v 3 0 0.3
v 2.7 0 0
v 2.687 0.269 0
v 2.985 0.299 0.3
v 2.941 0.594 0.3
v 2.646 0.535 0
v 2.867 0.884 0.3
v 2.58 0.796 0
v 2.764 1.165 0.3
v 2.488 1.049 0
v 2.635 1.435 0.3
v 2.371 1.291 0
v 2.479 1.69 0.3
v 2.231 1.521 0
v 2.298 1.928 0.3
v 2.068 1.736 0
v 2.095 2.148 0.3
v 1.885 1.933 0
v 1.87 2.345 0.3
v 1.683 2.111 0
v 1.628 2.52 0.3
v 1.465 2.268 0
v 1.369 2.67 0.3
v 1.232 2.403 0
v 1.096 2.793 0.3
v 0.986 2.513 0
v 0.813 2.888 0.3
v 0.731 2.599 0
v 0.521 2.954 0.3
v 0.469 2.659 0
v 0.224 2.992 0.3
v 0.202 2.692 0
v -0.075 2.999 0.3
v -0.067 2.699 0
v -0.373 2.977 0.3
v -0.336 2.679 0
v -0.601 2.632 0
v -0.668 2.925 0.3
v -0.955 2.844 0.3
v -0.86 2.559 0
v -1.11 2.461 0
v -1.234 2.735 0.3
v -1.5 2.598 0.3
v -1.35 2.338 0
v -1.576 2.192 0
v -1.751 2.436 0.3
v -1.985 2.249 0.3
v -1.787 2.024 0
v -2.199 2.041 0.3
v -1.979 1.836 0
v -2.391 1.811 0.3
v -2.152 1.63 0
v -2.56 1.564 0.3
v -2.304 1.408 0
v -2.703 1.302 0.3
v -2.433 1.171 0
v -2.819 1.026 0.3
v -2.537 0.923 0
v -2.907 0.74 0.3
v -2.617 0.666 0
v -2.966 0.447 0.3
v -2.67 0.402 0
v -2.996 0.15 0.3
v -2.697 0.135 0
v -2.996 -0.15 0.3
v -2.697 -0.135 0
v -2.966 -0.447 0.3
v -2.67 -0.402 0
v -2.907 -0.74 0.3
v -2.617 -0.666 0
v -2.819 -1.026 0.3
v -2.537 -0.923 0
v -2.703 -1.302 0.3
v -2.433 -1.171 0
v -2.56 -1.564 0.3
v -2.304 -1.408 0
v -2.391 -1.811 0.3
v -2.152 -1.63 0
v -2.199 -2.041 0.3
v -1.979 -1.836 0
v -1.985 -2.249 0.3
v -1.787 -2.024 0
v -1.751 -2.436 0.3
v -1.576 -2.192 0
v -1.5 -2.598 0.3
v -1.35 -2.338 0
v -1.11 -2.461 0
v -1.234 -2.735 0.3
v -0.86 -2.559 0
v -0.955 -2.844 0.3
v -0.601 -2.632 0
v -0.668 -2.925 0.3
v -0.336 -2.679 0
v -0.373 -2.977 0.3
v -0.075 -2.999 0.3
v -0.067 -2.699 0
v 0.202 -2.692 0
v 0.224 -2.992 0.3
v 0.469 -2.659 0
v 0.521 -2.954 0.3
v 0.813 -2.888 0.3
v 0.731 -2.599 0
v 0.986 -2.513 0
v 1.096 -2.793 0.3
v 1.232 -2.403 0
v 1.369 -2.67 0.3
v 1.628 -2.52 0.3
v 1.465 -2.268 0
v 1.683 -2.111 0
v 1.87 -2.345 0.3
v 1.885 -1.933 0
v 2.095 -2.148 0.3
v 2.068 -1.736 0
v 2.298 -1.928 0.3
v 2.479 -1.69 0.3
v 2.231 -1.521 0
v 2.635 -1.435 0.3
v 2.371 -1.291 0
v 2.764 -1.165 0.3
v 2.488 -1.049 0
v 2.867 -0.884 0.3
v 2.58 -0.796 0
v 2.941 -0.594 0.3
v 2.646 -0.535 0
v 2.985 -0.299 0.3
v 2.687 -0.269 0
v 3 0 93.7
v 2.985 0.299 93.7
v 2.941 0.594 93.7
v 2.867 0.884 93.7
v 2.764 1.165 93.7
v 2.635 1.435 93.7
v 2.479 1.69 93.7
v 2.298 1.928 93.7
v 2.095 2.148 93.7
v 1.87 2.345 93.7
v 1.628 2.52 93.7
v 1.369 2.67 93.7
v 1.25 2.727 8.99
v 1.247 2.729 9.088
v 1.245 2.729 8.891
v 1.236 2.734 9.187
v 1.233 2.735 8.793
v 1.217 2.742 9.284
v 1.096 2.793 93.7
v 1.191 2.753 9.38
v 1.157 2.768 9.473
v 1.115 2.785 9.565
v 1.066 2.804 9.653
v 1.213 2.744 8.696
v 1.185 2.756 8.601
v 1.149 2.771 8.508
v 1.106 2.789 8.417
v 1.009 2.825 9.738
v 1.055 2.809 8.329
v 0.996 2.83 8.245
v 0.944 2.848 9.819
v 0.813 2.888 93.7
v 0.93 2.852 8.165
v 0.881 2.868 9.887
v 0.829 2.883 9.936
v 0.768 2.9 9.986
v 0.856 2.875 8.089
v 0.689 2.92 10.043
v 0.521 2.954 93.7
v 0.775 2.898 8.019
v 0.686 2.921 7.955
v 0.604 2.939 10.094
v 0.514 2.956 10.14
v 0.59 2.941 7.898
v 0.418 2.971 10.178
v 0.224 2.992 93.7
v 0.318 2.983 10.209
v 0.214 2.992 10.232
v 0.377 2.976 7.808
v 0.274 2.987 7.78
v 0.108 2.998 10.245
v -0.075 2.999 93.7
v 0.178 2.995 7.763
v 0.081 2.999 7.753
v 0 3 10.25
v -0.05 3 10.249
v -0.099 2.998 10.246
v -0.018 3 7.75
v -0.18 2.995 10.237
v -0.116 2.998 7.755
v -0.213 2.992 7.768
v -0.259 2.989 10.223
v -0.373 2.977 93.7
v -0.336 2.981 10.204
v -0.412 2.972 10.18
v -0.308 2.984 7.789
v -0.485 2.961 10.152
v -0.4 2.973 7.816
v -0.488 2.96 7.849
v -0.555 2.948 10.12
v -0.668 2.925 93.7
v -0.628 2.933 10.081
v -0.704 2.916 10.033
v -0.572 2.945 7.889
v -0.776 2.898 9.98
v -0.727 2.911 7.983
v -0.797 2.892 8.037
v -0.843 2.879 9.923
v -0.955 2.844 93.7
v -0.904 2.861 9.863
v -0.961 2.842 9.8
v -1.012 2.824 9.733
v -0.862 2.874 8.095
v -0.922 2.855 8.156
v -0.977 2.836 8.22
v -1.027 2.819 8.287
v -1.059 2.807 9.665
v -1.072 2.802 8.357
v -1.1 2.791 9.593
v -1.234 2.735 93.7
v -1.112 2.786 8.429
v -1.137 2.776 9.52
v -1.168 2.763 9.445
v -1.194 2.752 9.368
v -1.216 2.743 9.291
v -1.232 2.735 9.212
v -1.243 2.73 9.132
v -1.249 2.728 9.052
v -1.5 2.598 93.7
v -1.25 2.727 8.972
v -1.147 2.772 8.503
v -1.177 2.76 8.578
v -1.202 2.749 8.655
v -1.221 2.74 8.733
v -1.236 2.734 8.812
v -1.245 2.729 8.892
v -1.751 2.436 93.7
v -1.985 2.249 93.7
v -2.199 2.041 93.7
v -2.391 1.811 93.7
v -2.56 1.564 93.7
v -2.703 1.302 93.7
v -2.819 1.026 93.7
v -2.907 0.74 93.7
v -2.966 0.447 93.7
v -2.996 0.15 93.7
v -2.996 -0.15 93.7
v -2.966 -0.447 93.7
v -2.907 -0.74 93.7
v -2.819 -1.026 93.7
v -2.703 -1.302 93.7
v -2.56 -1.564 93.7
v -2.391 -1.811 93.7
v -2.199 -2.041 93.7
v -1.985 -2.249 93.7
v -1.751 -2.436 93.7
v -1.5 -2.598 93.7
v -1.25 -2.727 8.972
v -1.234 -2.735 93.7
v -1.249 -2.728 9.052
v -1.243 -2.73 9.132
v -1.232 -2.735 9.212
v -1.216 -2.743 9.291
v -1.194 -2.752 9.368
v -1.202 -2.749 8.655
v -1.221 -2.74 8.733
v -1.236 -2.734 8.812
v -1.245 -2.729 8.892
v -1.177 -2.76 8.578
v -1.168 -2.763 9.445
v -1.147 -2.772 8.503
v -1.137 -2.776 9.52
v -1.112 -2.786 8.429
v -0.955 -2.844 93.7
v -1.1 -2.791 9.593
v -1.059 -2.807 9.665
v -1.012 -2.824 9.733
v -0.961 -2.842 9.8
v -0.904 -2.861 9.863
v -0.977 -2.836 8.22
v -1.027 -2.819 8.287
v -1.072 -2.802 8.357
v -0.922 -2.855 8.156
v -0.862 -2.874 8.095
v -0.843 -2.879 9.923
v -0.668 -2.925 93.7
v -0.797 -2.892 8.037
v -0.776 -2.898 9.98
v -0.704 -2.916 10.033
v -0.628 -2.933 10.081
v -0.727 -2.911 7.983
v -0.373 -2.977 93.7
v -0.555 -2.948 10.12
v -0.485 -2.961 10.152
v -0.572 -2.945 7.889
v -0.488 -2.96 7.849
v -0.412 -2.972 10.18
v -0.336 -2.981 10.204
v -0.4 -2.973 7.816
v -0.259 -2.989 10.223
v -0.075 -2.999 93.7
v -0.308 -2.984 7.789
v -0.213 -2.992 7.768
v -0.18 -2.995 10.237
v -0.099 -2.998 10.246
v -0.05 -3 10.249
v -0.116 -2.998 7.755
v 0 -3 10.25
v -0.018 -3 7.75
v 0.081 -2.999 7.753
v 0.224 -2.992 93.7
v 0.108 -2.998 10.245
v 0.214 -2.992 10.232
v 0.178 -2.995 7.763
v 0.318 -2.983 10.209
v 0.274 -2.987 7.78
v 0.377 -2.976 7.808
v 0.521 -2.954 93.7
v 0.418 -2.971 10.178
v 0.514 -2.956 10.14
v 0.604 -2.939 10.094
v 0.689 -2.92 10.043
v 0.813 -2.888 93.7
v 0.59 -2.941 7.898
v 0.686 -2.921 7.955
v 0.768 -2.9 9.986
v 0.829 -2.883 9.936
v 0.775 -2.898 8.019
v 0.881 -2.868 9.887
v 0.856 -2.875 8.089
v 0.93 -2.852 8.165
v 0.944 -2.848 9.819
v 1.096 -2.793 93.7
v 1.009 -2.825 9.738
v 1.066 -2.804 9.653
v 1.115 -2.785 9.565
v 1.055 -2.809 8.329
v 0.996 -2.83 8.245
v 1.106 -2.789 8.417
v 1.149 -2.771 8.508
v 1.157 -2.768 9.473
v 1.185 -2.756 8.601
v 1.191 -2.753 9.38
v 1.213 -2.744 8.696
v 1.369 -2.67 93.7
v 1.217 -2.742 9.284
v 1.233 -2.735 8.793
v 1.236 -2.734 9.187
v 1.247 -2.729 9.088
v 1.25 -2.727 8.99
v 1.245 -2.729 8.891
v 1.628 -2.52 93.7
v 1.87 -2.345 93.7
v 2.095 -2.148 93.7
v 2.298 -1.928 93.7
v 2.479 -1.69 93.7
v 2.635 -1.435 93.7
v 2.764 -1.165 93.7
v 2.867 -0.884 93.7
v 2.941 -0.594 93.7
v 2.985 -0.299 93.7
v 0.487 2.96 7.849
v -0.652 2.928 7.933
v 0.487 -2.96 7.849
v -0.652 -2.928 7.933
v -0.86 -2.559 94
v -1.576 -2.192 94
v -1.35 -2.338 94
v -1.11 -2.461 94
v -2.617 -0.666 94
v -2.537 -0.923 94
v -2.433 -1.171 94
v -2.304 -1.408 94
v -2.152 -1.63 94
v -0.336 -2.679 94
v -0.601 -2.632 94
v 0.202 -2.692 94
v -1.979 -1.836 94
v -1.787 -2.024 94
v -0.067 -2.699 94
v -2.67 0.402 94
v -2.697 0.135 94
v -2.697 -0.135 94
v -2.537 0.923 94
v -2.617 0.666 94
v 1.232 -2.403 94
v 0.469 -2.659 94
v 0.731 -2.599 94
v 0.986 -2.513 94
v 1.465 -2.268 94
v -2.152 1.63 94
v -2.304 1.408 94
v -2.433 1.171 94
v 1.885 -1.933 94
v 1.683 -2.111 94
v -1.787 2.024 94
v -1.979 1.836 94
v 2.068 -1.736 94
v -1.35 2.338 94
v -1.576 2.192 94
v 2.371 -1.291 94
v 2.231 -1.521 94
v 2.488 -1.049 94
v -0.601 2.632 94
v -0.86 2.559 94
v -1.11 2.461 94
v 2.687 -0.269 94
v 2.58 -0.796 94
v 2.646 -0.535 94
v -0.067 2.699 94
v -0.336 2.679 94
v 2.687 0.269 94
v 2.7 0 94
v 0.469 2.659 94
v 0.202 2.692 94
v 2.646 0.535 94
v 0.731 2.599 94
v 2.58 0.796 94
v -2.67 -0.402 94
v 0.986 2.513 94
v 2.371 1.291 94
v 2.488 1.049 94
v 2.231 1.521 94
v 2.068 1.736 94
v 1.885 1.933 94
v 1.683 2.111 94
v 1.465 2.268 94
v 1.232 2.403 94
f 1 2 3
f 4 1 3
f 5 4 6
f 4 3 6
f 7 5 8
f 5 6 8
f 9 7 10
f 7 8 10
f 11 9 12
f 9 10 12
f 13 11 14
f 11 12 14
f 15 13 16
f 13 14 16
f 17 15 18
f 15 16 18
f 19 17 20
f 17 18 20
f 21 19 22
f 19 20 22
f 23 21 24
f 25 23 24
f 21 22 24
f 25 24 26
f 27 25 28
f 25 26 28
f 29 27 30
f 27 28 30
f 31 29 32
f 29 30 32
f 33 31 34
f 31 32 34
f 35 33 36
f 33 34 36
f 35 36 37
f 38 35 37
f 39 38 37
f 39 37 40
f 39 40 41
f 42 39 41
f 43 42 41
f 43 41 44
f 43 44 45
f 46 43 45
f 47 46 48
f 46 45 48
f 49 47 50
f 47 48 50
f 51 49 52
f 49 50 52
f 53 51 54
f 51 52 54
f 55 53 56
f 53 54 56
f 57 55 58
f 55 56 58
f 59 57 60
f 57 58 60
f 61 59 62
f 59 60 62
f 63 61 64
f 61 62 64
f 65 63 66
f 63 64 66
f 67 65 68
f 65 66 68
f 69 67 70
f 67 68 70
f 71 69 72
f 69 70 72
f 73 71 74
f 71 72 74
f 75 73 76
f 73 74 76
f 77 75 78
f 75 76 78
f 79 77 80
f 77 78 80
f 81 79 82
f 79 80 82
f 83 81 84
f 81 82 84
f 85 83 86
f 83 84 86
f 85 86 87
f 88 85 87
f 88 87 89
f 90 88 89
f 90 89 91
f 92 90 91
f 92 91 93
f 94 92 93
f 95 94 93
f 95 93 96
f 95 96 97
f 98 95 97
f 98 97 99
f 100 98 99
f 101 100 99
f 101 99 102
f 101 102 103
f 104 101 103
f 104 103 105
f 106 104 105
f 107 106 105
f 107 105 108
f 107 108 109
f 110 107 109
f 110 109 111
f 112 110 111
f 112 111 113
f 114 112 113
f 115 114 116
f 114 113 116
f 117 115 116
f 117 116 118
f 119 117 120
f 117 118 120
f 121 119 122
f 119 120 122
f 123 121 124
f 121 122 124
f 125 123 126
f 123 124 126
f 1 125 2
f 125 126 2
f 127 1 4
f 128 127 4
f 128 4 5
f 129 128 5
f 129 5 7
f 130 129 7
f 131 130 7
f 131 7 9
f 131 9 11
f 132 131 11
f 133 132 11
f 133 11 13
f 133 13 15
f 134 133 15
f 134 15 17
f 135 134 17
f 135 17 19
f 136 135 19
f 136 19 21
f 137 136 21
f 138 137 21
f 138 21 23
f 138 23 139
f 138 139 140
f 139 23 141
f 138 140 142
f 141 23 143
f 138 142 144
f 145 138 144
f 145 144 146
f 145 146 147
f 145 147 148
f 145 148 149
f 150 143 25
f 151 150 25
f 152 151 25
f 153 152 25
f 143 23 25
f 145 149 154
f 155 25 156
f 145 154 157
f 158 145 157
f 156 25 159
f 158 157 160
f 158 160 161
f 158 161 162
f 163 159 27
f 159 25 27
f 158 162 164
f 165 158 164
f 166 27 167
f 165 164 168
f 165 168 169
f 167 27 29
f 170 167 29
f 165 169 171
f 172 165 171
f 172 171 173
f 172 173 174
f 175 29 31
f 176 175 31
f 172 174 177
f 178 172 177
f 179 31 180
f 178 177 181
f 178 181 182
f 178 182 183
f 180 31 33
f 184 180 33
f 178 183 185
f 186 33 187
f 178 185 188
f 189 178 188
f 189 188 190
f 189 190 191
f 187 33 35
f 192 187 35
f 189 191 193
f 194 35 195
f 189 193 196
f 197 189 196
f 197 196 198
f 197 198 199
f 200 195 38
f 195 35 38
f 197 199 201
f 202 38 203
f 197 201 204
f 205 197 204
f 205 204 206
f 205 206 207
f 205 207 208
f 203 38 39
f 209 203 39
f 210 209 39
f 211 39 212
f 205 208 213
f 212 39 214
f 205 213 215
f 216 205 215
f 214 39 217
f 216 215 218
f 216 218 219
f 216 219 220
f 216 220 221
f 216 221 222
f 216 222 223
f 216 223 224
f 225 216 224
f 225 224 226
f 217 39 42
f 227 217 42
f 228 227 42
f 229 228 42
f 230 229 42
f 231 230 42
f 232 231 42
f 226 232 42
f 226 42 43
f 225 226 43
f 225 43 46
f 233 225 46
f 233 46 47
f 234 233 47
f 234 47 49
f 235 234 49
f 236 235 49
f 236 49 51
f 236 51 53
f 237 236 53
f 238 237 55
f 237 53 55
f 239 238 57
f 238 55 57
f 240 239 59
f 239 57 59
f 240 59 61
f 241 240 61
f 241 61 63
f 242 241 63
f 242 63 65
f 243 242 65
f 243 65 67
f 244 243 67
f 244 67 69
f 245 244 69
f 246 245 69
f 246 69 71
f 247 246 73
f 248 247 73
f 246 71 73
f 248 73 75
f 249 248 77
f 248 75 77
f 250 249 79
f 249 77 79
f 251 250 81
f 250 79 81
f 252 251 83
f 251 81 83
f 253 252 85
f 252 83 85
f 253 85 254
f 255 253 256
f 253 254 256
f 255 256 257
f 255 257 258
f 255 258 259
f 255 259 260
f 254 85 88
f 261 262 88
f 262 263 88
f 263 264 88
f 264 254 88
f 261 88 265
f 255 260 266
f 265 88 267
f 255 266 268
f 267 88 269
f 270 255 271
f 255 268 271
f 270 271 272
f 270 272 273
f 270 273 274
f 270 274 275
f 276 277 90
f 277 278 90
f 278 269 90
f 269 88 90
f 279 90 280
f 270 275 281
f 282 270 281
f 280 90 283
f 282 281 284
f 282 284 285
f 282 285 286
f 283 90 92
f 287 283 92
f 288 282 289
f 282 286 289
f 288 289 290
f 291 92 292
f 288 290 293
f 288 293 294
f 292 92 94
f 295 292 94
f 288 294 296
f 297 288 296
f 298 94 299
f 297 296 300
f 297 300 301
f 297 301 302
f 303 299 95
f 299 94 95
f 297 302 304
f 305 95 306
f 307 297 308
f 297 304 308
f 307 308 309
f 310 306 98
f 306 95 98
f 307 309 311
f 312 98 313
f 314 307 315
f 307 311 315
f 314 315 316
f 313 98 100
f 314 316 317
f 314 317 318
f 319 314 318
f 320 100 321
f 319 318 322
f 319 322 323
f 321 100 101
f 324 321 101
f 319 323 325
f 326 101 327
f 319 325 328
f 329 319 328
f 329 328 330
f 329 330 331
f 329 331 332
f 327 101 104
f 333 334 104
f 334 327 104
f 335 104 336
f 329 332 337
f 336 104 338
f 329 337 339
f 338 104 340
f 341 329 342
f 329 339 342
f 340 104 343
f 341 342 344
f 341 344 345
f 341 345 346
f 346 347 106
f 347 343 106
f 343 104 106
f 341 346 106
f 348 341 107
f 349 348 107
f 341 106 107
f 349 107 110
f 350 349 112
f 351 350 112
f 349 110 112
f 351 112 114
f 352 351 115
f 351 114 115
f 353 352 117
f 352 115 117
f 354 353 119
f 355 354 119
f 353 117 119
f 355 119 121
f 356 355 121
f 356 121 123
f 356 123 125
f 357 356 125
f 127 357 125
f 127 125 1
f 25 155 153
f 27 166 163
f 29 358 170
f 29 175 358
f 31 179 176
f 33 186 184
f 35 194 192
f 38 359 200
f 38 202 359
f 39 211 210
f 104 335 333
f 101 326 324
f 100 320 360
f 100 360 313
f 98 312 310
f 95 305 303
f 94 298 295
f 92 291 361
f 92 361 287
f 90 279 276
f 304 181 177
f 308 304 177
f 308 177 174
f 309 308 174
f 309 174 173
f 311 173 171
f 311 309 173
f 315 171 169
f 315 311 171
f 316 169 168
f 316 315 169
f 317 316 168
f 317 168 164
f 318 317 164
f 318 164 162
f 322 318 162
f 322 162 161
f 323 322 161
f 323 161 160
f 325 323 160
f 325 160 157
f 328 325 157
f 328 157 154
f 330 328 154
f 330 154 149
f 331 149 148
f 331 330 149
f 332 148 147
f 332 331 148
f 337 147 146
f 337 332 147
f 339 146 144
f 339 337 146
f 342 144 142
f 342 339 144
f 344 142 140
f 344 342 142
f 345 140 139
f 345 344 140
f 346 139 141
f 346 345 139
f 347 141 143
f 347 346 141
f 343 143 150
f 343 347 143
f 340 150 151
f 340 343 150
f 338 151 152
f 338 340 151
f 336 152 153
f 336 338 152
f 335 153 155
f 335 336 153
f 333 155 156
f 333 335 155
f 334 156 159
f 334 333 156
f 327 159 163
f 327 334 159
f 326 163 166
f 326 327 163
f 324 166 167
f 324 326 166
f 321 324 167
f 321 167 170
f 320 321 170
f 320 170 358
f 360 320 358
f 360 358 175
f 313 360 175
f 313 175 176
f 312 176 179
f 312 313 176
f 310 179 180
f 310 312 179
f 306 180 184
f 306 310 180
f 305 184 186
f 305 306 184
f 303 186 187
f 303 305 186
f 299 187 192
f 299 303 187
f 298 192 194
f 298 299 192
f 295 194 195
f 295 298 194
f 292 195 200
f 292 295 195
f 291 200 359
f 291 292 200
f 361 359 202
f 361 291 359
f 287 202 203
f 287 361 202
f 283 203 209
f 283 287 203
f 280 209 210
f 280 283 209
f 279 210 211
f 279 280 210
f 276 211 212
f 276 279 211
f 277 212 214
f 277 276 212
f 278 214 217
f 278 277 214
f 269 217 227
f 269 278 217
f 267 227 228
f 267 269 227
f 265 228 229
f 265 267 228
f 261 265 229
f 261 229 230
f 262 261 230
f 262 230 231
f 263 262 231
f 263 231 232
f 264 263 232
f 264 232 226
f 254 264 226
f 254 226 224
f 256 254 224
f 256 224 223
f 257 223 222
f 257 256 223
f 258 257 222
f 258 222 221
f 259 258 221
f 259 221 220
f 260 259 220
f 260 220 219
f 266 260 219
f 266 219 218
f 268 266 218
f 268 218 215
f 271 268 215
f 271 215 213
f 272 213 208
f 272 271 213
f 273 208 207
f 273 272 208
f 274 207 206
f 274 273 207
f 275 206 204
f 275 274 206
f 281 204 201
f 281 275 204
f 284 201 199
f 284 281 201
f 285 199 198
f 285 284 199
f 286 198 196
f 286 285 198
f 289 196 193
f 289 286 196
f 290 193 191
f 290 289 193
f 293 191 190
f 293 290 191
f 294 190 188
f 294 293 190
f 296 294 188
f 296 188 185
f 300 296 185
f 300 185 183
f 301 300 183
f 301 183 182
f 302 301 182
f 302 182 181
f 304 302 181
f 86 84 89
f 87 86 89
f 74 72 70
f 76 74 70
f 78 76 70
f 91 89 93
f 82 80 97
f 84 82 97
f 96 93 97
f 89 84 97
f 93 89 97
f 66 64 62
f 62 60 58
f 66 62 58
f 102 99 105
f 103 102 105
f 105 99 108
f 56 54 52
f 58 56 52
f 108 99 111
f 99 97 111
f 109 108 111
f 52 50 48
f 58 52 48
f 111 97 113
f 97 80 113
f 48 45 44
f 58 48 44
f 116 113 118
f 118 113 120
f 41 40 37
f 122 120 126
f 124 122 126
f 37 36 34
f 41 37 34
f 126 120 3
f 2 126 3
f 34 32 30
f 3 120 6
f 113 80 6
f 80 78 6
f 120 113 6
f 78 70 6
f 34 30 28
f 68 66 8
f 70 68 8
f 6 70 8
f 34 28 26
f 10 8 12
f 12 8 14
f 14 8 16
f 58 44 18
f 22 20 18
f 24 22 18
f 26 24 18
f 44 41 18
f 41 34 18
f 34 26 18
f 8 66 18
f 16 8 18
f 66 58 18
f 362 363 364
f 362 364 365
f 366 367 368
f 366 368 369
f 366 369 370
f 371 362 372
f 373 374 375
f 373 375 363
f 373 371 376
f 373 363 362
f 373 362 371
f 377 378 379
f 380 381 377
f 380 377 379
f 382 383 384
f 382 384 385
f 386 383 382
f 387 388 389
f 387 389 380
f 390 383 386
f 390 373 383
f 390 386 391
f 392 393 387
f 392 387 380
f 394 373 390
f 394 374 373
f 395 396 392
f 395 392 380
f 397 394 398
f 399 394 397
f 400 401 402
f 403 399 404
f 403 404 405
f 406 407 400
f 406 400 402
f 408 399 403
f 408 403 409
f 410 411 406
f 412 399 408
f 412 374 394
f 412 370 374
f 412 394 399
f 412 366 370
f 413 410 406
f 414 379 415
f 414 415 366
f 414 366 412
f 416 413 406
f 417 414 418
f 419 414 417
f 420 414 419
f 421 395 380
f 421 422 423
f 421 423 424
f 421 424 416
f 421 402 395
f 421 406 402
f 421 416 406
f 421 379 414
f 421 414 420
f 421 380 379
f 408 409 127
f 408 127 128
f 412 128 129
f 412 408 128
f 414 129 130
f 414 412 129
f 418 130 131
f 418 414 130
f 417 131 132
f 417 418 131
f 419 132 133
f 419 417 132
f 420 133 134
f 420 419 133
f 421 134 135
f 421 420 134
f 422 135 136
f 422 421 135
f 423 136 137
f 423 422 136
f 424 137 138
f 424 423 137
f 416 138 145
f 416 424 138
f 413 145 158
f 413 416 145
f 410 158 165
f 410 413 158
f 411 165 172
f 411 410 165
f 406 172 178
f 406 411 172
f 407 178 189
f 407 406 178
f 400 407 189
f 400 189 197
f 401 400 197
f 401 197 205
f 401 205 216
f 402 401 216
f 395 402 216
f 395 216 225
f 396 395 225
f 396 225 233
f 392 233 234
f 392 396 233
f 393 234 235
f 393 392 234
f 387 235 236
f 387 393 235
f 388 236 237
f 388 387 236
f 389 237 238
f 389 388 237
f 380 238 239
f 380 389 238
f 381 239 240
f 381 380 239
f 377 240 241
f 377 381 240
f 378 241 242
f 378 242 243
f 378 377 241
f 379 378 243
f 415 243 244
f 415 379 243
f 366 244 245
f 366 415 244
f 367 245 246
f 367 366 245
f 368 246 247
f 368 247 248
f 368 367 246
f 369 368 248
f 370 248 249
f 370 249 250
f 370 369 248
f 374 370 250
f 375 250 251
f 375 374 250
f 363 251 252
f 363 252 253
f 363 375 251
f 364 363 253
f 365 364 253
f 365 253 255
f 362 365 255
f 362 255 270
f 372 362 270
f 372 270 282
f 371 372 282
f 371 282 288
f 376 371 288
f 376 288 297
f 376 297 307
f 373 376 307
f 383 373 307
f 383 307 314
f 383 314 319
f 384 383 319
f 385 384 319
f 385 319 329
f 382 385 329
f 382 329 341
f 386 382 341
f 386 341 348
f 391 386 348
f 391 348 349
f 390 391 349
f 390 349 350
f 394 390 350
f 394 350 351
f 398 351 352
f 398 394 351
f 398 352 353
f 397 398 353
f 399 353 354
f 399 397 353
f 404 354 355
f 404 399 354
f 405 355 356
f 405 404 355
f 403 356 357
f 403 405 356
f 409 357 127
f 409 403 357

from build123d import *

# Parameters (mm, degrees)
ESQUISSE1_R                  = 3
BOSS_EXTRU_1_DEPTH           = 94
ENL_V_MAT_EXTRU_1_DEPTH      = 95.09569597
ENL_V_MAT_EXTRU_1_DEPTH_BACK = 95.09569597
ESQUISSE2_R                  = 1.25
CHANFREIN1_SIZE              = 0.3


with BuildPart() as part:
    # Esquisse1 → Boss.-Extru.1 (new body)
    with BuildSketch(Plane.XY):
        Circle(ESQUISSE1_R)
    extrude(amount=BOSS_EXTRU_1_DEPTH)

    # Esquisse2 → Enlèv. mat.-Extru.1 (cut, two sides: drawn at the far end of the back side and taken through both)
    with BuildSketch(Plane(origin=(0, 0, 0), x_dir=(1, 0, 0), z_dir=(0, 1, 0)).offset(-ENL_V_MAT_EXTRU_1_DEPTH_BACK)):
        with Locations(Location((0, -9, 0), (0, 0, 270))):
            Circle(ESQUISSE2_R)
    extrude(amount=ENL_V_MAT_EXTRU_1_DEPTH + ENL_V_MAT_EXTRU_1_DEPTH_BACK, mode=Mode.SUBTRACT)

    # Chanfrein1
    chanfrein1_edges = [part.edges().sort_by_distance(p)[0] for p in [
        (-3, 0, 0),
        (-3, 0, 94),
    ]]
    chamfer(chanfrein1_edges, length=CHANFREIN1_SIZE)


solid = part.part
